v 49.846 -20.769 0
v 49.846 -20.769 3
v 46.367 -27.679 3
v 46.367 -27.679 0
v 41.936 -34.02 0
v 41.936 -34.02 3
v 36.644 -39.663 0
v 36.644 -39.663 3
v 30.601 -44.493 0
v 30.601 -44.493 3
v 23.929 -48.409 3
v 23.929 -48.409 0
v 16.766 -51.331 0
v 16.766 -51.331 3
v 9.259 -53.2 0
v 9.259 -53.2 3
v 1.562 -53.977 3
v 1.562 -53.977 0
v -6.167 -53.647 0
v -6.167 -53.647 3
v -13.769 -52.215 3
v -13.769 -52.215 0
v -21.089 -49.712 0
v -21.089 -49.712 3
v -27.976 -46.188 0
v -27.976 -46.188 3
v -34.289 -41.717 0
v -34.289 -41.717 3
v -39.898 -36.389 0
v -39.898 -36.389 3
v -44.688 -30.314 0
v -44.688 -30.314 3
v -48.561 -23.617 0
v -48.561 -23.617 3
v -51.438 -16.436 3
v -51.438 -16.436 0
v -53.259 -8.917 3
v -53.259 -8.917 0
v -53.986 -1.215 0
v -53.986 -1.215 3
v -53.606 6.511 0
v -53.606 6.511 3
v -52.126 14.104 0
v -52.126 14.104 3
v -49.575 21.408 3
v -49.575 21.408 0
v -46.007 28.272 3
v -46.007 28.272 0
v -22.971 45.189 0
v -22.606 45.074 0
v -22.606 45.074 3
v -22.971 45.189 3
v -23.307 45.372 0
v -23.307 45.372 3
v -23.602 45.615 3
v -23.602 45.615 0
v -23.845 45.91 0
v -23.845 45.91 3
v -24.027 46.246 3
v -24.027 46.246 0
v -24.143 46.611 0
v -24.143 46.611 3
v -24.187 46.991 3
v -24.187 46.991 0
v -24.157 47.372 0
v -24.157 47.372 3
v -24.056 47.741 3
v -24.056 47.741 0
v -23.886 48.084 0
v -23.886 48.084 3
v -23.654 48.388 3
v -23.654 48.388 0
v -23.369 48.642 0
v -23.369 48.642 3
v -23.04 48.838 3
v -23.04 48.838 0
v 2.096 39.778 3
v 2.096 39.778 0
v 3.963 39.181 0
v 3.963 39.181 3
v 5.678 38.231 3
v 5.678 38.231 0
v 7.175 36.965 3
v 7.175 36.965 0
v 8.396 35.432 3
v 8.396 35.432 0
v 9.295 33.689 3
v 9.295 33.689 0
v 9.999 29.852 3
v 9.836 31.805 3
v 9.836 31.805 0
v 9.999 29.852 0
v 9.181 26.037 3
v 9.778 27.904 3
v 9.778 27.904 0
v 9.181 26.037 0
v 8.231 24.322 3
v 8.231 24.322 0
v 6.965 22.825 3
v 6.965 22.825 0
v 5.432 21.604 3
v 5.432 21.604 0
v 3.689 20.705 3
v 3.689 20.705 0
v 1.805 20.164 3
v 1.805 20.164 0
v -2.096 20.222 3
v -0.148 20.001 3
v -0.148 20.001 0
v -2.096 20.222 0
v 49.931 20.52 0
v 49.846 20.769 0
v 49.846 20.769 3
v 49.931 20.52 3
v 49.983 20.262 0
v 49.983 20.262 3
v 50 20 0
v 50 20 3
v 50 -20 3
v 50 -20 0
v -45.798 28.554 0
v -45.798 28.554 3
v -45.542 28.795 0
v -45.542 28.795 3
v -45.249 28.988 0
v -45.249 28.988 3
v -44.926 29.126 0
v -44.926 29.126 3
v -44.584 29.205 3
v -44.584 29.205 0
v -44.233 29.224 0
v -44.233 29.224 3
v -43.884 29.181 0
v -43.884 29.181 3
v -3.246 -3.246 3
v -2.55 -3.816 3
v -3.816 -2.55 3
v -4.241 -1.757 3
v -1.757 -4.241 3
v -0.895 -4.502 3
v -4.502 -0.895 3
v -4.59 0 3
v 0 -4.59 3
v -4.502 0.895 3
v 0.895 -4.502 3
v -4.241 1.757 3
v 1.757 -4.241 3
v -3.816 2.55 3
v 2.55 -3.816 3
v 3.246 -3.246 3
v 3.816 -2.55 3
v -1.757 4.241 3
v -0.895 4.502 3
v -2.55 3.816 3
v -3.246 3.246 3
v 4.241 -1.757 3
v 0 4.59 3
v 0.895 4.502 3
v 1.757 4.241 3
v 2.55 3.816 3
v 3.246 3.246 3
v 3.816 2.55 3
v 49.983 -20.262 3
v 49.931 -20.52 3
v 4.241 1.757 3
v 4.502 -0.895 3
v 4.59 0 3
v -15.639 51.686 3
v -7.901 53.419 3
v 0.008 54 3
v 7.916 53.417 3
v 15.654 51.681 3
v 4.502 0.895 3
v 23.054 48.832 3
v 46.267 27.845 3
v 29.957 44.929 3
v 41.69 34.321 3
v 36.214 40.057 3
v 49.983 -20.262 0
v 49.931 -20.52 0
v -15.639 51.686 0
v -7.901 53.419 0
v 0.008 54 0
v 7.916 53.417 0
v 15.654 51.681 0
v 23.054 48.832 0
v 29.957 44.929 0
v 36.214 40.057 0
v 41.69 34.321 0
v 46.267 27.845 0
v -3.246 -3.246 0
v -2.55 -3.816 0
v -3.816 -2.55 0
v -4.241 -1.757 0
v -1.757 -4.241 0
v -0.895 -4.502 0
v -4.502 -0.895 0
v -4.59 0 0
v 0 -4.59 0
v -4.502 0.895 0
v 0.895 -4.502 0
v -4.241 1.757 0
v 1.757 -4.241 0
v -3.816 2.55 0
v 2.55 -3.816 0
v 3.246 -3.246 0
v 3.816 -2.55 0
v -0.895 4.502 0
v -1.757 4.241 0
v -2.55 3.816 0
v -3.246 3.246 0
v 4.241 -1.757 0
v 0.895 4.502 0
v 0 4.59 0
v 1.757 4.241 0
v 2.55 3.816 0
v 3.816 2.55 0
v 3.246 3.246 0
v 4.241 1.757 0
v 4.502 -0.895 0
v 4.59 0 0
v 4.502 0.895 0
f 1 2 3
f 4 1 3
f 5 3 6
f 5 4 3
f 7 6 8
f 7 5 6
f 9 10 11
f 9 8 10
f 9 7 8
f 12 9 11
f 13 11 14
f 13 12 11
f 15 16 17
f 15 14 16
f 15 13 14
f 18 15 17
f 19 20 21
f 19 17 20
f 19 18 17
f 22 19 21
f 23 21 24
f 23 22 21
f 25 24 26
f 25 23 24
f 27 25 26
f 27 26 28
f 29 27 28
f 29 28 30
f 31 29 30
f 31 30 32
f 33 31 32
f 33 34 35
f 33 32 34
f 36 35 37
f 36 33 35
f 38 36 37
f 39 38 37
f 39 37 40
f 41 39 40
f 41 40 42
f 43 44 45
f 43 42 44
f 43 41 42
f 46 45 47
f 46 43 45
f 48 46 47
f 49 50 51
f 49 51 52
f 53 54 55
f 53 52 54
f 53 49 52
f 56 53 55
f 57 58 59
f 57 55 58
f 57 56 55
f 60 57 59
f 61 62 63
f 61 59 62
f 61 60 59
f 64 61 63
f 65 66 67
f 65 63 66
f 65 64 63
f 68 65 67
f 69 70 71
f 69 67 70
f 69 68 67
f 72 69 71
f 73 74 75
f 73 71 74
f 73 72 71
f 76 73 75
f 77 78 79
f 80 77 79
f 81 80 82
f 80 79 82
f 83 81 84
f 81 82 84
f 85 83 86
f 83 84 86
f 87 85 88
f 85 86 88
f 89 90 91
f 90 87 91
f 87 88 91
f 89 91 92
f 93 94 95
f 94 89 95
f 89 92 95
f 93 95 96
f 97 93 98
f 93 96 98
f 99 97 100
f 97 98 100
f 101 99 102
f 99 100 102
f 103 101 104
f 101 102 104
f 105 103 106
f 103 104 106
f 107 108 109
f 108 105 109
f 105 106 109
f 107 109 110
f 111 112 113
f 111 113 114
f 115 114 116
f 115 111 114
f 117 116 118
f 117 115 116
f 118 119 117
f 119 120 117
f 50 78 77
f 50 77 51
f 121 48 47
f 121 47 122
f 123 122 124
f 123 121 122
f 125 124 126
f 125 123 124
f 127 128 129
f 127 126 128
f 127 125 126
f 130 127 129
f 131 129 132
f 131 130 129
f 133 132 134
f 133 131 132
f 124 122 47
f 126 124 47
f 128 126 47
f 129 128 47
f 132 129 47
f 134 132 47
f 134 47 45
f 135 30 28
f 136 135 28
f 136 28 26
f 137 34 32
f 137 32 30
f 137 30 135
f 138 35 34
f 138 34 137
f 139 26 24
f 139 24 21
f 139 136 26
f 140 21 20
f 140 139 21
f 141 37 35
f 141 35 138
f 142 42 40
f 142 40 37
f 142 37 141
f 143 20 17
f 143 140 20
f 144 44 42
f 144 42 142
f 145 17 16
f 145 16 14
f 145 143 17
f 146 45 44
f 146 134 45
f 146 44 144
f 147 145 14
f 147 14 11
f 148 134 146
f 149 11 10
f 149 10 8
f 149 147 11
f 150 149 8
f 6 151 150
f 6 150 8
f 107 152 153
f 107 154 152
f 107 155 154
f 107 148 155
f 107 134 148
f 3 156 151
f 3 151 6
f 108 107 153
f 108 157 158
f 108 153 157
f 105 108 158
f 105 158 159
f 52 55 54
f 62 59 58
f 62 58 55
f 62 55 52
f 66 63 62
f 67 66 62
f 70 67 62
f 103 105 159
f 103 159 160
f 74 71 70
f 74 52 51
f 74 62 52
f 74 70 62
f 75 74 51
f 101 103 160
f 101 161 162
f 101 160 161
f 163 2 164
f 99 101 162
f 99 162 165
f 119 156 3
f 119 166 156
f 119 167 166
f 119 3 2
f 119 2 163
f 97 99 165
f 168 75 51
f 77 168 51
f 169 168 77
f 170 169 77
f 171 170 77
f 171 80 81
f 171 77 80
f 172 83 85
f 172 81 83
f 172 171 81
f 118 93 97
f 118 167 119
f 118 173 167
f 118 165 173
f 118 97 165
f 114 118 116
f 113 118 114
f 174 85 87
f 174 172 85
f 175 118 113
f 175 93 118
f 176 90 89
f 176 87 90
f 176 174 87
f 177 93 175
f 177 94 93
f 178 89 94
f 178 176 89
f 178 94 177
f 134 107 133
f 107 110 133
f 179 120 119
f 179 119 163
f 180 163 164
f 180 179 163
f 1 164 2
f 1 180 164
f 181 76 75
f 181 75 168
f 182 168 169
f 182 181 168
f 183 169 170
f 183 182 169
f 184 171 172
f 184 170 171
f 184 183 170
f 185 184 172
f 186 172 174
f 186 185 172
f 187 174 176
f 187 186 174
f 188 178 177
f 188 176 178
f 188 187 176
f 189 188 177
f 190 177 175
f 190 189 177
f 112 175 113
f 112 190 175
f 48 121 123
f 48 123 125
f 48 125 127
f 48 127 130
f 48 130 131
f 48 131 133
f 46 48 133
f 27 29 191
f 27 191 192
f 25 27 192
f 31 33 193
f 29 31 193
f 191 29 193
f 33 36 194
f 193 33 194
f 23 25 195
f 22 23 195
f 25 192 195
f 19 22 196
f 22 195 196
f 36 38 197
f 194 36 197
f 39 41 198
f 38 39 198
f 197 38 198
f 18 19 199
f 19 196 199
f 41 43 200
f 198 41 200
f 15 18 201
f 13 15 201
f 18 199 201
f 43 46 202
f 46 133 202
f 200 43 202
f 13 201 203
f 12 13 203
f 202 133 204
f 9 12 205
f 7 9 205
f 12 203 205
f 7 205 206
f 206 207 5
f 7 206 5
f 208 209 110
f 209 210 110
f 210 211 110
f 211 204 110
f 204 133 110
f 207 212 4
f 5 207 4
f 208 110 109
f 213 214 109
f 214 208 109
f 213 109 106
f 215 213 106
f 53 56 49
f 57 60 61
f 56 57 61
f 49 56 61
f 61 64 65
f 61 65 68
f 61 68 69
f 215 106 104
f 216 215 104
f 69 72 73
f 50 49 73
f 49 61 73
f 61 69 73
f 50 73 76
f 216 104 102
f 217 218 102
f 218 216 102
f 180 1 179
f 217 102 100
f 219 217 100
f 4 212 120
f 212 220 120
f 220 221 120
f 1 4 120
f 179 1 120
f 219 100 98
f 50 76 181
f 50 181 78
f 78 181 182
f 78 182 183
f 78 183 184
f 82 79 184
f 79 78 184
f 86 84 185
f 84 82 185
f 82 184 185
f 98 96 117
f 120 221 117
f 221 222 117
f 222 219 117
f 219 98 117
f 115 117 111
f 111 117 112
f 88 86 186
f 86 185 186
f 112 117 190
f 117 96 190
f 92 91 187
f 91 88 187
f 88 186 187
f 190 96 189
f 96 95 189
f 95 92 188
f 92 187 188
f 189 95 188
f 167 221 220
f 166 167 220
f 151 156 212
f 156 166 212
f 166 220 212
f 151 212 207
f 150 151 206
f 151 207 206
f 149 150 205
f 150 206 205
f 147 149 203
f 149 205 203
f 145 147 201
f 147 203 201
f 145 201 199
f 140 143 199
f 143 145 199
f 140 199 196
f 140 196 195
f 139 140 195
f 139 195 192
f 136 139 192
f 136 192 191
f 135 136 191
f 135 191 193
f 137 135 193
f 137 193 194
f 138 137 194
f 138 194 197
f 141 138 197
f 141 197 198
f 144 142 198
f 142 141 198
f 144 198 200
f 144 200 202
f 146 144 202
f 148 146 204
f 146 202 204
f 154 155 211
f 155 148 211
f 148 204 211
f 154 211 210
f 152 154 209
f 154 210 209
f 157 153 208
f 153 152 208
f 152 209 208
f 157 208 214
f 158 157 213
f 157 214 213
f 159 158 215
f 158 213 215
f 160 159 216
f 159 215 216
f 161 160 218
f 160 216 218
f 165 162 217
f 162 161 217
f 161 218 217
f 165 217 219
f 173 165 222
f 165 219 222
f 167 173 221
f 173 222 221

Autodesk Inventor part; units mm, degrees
ref_plane "YZ Plane" through (0, 0, 0) normal (1, 0, 0) x (0, 1, 0)
ref_plane "XZ Plane" through (0, 0, 0) normal (0, 1, 0) x (-1, 0, 0)
ref_plane "XY Plane" through (0, 0, 0) normal (0, 0, 1) x (1, 0, 0)
sketch "Sketch1" plane through (0, 0, 0) normal (0, 0, 1) x (1, 0, 0)
  circle A0 centre (0, 0) radius 4.59
  arc A1 (-2.0962, 20.2222) -> (2.0962, 39.7778) centre (0, 30) ccw
  line L0 (2.0962, 39.7778) -> (-22.6062, 45.0736)
  line L1 (-2.0962, 20.2222) -> (-43.8842, 29.1807)
  line L2 (50, -20) -> (50, 20)
  arc A2 (-46.0074, 28.2723) -> (49.8462, -20.7692) centre (0, 0) ccw
  arc A3 (49.8462, 20.7692) -> (-23.0403, 48.8379) centre (0, 0) ccw
  arc A4 (-43.8842, 29.1807) -> (-46.0074, 28.2723) centre (-44.3034, 27.2252) ccw
  arc A5 (-23.0403, 48.8379) -> (-22.6062, 45.0736) centre (-22.187, 47.0291) ccw
  arc A6 (50, 20) -> (49.8462, 20.7692) centre (48, 20) ccw
  arc A7 (49.8462, -20.7692) -> (50, -20) centre (48, -20) ccw
  point P0 (-27.9313, 46.2152)
  point P1 (-45.2476, 29.473)
  point P2 (50, -20.3961)
  point P3 (50, 20.3961)
  dimension "d1" = 9.18
  dimension "d4" = 20
  dimension "d5" = 30
  dimension "d12" = 50
  dimension "d13" = 2
  dimension "d14" = 54
  dimension "d15" = 54
  dimension "d16" = 20
  dimension "d19" = 77.9
  dimension "d20" = 50
extrude "Extrusion3" add sketch "Sketch1" along normal blind 3
properties part number "OpenROV 2_3_2 Dev EndCap 108"
